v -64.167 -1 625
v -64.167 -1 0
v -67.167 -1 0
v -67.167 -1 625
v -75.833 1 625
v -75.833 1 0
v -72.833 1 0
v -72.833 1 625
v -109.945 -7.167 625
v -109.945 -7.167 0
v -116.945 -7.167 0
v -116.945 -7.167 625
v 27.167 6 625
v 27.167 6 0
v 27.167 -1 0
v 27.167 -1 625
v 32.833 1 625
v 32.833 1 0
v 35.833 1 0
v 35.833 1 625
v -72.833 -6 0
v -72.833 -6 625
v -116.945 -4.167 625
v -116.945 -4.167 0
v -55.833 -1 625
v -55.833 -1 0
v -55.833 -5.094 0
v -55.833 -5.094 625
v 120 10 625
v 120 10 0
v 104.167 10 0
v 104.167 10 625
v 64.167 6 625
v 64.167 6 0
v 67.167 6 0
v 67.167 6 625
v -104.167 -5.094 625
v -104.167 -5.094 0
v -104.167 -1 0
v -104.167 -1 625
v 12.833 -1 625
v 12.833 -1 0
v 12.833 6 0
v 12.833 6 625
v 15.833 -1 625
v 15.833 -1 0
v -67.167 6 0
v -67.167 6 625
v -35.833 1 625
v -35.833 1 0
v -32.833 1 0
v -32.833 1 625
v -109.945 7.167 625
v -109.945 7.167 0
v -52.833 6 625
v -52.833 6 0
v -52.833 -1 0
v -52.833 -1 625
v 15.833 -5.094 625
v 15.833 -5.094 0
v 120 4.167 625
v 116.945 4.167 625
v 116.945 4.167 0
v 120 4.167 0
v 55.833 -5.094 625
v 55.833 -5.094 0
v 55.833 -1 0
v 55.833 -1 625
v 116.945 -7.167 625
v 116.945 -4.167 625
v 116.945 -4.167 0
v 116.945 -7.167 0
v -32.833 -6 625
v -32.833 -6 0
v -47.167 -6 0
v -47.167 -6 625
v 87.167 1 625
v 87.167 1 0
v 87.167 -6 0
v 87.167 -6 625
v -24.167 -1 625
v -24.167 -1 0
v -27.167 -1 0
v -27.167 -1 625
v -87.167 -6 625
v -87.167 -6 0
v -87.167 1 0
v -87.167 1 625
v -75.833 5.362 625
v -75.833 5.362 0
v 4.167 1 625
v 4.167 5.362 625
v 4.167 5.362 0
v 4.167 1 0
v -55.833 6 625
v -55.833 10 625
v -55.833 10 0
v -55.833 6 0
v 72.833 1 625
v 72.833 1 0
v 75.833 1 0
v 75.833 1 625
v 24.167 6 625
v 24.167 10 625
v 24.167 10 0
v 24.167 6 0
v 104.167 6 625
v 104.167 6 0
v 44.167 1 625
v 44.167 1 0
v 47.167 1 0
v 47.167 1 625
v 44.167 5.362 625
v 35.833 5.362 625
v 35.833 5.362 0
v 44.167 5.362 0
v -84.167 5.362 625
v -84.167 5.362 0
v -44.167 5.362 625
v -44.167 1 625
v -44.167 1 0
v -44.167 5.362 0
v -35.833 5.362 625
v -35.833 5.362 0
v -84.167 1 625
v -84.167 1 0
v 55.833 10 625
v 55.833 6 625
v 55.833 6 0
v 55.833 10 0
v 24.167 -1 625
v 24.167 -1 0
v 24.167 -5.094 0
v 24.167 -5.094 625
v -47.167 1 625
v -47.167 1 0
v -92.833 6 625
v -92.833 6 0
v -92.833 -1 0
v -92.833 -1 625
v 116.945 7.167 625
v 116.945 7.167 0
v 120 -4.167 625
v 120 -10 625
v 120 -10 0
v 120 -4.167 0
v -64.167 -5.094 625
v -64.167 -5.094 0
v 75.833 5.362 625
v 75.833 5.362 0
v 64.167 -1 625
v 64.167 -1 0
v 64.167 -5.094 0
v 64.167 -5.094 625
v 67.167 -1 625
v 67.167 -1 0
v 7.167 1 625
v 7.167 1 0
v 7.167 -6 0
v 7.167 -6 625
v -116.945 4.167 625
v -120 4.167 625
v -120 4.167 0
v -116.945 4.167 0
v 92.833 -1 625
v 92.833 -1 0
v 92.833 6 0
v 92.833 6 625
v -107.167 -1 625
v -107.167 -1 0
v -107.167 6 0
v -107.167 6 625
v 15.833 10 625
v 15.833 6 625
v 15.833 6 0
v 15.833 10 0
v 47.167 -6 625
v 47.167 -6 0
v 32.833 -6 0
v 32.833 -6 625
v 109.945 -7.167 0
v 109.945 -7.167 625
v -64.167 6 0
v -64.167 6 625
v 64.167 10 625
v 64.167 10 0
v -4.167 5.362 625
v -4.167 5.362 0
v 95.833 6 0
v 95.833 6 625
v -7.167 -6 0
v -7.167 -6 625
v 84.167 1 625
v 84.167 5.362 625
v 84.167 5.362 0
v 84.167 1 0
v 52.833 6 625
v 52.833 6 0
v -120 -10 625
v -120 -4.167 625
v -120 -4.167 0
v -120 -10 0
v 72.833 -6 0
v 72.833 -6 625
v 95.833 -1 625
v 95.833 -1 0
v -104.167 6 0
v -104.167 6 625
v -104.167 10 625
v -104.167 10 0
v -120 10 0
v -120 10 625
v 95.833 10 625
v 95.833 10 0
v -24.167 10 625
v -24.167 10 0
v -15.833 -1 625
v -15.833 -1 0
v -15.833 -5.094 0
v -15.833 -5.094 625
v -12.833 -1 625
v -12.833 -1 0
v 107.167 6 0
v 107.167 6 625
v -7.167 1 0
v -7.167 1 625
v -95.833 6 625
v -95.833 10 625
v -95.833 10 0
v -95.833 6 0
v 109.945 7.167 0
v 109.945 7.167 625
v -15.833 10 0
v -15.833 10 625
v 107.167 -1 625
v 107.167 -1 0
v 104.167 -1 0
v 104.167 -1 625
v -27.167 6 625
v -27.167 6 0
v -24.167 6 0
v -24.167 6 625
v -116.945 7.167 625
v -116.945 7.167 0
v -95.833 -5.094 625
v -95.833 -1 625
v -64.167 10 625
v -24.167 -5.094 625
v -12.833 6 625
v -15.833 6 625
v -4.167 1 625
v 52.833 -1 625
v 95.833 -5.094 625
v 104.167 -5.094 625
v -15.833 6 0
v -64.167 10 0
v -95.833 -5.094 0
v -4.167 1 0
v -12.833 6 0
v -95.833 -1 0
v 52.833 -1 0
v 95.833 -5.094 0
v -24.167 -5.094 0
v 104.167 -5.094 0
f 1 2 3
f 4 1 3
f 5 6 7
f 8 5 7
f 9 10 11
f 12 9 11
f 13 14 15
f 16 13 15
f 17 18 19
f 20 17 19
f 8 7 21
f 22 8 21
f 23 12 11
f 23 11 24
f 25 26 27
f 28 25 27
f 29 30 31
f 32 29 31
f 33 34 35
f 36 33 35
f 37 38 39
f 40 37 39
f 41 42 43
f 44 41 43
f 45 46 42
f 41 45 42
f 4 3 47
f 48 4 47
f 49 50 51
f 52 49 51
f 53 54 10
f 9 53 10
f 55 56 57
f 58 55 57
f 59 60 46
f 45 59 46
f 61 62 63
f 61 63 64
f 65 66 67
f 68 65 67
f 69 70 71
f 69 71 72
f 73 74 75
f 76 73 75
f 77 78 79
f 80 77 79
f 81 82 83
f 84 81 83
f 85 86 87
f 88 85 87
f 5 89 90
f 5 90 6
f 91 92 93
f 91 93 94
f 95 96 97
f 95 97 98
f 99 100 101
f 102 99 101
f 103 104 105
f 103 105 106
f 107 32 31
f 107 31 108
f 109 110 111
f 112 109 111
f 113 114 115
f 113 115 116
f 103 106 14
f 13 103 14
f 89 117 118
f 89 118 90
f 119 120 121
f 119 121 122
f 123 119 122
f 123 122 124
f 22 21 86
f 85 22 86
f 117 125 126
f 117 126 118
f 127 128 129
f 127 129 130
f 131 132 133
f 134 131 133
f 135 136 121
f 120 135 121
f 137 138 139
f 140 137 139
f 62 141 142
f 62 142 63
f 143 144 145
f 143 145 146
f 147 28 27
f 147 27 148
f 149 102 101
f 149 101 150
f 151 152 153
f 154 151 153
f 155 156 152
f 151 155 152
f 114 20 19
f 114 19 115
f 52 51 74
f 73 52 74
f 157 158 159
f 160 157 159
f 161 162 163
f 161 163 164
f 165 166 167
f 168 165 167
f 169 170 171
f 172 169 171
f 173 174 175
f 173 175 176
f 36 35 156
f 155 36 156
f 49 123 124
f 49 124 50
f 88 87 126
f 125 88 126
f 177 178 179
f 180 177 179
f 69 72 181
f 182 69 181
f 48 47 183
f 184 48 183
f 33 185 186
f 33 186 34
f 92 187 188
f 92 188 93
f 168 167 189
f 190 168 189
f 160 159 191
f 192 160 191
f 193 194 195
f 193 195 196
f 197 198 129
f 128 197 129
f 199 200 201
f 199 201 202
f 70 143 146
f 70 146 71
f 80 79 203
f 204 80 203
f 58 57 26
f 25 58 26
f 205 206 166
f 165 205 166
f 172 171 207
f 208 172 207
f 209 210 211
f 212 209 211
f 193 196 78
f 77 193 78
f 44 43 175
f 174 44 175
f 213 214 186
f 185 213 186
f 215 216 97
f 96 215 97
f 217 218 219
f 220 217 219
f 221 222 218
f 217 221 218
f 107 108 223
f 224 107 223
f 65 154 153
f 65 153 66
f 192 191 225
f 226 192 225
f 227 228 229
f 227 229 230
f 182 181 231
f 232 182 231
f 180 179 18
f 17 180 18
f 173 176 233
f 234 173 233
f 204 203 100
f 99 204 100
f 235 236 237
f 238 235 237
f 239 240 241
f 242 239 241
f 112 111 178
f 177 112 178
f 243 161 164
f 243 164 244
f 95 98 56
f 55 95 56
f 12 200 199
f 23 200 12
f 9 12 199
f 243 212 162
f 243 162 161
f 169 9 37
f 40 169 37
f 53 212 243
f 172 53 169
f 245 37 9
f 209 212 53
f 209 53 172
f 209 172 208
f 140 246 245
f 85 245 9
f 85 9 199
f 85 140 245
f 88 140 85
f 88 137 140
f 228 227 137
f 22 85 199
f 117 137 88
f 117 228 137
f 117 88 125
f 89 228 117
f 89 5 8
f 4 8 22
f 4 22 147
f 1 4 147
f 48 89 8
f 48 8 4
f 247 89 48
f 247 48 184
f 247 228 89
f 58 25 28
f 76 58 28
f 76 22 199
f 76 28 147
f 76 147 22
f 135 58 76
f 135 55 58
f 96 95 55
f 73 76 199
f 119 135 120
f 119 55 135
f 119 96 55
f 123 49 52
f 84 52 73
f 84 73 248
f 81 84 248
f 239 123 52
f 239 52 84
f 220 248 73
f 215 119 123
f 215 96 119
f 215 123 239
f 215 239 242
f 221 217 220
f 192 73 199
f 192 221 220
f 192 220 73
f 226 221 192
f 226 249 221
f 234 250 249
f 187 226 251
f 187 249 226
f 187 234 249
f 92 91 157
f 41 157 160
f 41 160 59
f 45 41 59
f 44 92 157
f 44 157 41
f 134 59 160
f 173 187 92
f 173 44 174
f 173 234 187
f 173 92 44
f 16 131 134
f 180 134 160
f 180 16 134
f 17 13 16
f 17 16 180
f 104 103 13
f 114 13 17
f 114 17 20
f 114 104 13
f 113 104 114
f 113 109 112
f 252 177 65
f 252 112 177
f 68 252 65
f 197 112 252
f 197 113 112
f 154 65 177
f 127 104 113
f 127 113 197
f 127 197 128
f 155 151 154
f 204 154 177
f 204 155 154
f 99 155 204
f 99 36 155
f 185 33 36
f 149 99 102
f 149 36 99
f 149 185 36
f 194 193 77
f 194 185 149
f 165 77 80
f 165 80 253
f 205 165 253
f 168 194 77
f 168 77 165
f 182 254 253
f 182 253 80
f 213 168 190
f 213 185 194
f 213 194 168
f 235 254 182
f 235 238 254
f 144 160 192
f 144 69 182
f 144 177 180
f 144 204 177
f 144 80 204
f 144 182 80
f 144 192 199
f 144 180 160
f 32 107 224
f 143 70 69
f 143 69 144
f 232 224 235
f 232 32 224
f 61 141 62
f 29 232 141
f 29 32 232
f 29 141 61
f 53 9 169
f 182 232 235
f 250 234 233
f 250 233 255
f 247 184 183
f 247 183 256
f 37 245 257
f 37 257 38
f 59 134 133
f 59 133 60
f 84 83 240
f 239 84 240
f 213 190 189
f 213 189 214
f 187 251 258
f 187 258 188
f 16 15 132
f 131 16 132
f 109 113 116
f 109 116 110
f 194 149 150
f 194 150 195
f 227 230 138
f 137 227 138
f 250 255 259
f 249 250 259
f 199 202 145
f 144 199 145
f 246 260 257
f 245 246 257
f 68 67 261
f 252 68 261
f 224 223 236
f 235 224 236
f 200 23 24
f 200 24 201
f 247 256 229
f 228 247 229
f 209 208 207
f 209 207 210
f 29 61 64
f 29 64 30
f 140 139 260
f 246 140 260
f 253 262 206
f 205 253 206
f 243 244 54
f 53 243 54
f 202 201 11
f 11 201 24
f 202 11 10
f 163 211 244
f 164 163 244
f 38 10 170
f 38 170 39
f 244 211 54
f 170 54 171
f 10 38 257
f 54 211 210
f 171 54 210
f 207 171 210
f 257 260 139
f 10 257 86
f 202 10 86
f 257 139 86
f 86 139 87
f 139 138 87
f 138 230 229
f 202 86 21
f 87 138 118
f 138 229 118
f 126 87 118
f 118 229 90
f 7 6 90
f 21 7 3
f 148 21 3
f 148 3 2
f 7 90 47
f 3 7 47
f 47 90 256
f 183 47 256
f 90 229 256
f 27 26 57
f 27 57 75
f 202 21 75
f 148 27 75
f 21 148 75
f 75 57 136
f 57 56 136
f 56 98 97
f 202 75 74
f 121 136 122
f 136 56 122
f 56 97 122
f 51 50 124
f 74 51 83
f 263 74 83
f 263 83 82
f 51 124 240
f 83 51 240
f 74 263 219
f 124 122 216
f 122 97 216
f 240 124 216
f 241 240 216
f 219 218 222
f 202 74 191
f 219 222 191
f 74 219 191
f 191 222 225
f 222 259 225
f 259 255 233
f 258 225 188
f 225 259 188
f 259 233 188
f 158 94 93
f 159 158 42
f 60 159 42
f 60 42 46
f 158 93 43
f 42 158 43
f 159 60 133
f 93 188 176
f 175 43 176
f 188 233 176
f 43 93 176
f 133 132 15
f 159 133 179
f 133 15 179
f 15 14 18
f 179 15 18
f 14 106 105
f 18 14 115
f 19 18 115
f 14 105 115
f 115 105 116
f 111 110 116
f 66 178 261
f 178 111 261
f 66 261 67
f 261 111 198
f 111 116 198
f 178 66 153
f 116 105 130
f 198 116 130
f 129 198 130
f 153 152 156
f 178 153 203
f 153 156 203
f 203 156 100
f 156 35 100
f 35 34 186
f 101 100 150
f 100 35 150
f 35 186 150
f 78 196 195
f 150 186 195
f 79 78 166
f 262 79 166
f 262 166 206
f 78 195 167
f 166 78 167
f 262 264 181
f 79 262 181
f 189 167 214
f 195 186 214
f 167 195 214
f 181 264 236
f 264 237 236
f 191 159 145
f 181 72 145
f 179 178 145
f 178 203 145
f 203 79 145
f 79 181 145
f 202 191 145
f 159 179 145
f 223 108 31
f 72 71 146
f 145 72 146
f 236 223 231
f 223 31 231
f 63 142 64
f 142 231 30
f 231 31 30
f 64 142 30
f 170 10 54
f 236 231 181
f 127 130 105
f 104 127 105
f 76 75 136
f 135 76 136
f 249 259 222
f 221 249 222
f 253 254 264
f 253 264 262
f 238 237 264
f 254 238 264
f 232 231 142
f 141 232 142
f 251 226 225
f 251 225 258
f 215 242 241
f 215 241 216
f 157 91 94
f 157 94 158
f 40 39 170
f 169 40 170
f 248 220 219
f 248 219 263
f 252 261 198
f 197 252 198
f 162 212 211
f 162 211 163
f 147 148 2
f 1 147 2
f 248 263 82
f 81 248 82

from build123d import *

# Parameters (mm, degrees)
BOSS_EXTRUDE1_DEPTH = 625


with BuildPart() as part:
    # Sketch1 → Boss-Extrude1 (new body)
    with BuildSketch(Plane.XY):
        Polygon((-120, 10), (-120, 4.166666667), (-116.945068586, 4.166666667), (-116.945068586, 7.166666667), (-109.945068586, 7.166666667), (-109.945068586, -7.166666667), (-116.945068586, -7.166666667), (-116.945068586, -4.166666667), (-120, -4.166666667), (-120, -10), (120, -10), (120, -4.166666667), (116.945068586, -4.166666667), (116.945068586, -7.166666667), (109.945068586, -7.166666667), (109.945068586, 7.166666667), (116.945068586, 7.166666667), (116.945068586, 4.166666667), (120, 4.166666667), (120, 10), (104.166666667, 10), (104.166666667, 6), (107.166666667, 6), (107.166666667, -1), (104.166666667, -1), (104.166666667, -5.093909387), (95.833333333, -5.093909387), (95.833333333, -1), (92.833333333, -1), (92.833333333, 6), (95.833333333, 6), (95.833333333, 10), (64.166666667, 10), (64.166666667, 6), (67.166666667, 6), (67.166666667, -1), (64.166666667, -1), (64.166666667, -5.093909387), (55.833333333, -5.093909387), (55.833333333, -1), (52.833333333, -1), (52.833333333, 6), (55.833333333, 6), (55.833333333, 10), (24.166666667, 10), (24.166666667, 6), (27.166666667, 6), (27.166666667, -1), (24.166666667, -1), (24.166666667, -5.093909387), (15.833333333, -5.093909387), (15.833333333, -1), (12.833333333, -1), (12.833333333, 6), (15.833333333, 6), (15.833333333, 10), (-15.833333333, 10), (-15.833333333, 6), (-12.833333333, 6), (-12.833333333, -1), (-15.833333333, -1), (-15.833333333, -5.093909387), (-24.166666667, -5.093909387), (-24.166666667, -1), (-27.166666667, -1), (-27.166666667, 6), (-24.166666667, 6), (-24.166666667, 10), (-55.833333333, 10), (-55.833333333, 6), (-52.833333333, 6), (-52.833333333, -1), (-55.833333333, -1), (-55.833333333, -5.093909387), (-64.166666667, -5.093909387), (-64.166666667, -1), (-67.166666667, -1), (-67.166666667, 6), (-64.166666667, 6), (-64.166666667, 10), (-95.833333333, 10), (-95.833333333, 6), (-92.833333333, 6), (-92.833333333, -1), (-95.833333333, -1), (-95.833333333, -5.093909387), (-104.166666667, -5.093909387), (-104.166666667, -1), (-107.166666667, -1), (-107.166666667, 6), (-104.166666667, 6), (-104.166666667, 10), align=None)
        Polygon((-72.833333333, -6), (-87.166666667, -6), (-87.166666667, 1), (-84.166666667, 1), (-84.166666667, 5.362249924), (-75.833333333, 5.362249924), (-75.833333333, 1), (-72.833333333, 1), align=None, mode=Mode.SUBTRACT)
        Polygon((-32.833333333, -6), (-47.166666667, -6), (-47.166666667, 1), (-44.166666667, 1), (-44.166666667, 5.362249924), (-35.833333333, 5.362249924), (-35.833333333, 1), (-32.833333333, 1), align=None, mode=Mode.SUBTRACT)
        Polygon((7.166666667, -6), (-7.166666667, -6), (-7.166666667, 1), (-4.166666667, 1), (-4.166666667, 5.362249924), (4.166666667, 5.362249924), (4.166666667, 1), (7.166666667, 1), align=None, mode=Mode.SUBTRACT)
        Polygon((47.166666667, -6), (32.833333333, -6), (32.833333333, 1), (35.833333333, 1), (35.833333333, 5.362249924), (44.166666667, 5.362249924), (44.166666667, 1), (47.166666667, 1), align=None, mode=Mode.SUBTRACT)
        Polygon((87.166666667, -6), (72.833333333, -6), (72.833333333, 1), (75.833333333, 1), (75.833333333, 5.362249924), (84.166666667, 5.362249924), (84.166666667, 1), (87.166666667, 1), align=None, mode=Mode.SUBTRACT)
    extrude(amount=BOSS_EXTRUDE1_DEPTH)


solid = part.part
